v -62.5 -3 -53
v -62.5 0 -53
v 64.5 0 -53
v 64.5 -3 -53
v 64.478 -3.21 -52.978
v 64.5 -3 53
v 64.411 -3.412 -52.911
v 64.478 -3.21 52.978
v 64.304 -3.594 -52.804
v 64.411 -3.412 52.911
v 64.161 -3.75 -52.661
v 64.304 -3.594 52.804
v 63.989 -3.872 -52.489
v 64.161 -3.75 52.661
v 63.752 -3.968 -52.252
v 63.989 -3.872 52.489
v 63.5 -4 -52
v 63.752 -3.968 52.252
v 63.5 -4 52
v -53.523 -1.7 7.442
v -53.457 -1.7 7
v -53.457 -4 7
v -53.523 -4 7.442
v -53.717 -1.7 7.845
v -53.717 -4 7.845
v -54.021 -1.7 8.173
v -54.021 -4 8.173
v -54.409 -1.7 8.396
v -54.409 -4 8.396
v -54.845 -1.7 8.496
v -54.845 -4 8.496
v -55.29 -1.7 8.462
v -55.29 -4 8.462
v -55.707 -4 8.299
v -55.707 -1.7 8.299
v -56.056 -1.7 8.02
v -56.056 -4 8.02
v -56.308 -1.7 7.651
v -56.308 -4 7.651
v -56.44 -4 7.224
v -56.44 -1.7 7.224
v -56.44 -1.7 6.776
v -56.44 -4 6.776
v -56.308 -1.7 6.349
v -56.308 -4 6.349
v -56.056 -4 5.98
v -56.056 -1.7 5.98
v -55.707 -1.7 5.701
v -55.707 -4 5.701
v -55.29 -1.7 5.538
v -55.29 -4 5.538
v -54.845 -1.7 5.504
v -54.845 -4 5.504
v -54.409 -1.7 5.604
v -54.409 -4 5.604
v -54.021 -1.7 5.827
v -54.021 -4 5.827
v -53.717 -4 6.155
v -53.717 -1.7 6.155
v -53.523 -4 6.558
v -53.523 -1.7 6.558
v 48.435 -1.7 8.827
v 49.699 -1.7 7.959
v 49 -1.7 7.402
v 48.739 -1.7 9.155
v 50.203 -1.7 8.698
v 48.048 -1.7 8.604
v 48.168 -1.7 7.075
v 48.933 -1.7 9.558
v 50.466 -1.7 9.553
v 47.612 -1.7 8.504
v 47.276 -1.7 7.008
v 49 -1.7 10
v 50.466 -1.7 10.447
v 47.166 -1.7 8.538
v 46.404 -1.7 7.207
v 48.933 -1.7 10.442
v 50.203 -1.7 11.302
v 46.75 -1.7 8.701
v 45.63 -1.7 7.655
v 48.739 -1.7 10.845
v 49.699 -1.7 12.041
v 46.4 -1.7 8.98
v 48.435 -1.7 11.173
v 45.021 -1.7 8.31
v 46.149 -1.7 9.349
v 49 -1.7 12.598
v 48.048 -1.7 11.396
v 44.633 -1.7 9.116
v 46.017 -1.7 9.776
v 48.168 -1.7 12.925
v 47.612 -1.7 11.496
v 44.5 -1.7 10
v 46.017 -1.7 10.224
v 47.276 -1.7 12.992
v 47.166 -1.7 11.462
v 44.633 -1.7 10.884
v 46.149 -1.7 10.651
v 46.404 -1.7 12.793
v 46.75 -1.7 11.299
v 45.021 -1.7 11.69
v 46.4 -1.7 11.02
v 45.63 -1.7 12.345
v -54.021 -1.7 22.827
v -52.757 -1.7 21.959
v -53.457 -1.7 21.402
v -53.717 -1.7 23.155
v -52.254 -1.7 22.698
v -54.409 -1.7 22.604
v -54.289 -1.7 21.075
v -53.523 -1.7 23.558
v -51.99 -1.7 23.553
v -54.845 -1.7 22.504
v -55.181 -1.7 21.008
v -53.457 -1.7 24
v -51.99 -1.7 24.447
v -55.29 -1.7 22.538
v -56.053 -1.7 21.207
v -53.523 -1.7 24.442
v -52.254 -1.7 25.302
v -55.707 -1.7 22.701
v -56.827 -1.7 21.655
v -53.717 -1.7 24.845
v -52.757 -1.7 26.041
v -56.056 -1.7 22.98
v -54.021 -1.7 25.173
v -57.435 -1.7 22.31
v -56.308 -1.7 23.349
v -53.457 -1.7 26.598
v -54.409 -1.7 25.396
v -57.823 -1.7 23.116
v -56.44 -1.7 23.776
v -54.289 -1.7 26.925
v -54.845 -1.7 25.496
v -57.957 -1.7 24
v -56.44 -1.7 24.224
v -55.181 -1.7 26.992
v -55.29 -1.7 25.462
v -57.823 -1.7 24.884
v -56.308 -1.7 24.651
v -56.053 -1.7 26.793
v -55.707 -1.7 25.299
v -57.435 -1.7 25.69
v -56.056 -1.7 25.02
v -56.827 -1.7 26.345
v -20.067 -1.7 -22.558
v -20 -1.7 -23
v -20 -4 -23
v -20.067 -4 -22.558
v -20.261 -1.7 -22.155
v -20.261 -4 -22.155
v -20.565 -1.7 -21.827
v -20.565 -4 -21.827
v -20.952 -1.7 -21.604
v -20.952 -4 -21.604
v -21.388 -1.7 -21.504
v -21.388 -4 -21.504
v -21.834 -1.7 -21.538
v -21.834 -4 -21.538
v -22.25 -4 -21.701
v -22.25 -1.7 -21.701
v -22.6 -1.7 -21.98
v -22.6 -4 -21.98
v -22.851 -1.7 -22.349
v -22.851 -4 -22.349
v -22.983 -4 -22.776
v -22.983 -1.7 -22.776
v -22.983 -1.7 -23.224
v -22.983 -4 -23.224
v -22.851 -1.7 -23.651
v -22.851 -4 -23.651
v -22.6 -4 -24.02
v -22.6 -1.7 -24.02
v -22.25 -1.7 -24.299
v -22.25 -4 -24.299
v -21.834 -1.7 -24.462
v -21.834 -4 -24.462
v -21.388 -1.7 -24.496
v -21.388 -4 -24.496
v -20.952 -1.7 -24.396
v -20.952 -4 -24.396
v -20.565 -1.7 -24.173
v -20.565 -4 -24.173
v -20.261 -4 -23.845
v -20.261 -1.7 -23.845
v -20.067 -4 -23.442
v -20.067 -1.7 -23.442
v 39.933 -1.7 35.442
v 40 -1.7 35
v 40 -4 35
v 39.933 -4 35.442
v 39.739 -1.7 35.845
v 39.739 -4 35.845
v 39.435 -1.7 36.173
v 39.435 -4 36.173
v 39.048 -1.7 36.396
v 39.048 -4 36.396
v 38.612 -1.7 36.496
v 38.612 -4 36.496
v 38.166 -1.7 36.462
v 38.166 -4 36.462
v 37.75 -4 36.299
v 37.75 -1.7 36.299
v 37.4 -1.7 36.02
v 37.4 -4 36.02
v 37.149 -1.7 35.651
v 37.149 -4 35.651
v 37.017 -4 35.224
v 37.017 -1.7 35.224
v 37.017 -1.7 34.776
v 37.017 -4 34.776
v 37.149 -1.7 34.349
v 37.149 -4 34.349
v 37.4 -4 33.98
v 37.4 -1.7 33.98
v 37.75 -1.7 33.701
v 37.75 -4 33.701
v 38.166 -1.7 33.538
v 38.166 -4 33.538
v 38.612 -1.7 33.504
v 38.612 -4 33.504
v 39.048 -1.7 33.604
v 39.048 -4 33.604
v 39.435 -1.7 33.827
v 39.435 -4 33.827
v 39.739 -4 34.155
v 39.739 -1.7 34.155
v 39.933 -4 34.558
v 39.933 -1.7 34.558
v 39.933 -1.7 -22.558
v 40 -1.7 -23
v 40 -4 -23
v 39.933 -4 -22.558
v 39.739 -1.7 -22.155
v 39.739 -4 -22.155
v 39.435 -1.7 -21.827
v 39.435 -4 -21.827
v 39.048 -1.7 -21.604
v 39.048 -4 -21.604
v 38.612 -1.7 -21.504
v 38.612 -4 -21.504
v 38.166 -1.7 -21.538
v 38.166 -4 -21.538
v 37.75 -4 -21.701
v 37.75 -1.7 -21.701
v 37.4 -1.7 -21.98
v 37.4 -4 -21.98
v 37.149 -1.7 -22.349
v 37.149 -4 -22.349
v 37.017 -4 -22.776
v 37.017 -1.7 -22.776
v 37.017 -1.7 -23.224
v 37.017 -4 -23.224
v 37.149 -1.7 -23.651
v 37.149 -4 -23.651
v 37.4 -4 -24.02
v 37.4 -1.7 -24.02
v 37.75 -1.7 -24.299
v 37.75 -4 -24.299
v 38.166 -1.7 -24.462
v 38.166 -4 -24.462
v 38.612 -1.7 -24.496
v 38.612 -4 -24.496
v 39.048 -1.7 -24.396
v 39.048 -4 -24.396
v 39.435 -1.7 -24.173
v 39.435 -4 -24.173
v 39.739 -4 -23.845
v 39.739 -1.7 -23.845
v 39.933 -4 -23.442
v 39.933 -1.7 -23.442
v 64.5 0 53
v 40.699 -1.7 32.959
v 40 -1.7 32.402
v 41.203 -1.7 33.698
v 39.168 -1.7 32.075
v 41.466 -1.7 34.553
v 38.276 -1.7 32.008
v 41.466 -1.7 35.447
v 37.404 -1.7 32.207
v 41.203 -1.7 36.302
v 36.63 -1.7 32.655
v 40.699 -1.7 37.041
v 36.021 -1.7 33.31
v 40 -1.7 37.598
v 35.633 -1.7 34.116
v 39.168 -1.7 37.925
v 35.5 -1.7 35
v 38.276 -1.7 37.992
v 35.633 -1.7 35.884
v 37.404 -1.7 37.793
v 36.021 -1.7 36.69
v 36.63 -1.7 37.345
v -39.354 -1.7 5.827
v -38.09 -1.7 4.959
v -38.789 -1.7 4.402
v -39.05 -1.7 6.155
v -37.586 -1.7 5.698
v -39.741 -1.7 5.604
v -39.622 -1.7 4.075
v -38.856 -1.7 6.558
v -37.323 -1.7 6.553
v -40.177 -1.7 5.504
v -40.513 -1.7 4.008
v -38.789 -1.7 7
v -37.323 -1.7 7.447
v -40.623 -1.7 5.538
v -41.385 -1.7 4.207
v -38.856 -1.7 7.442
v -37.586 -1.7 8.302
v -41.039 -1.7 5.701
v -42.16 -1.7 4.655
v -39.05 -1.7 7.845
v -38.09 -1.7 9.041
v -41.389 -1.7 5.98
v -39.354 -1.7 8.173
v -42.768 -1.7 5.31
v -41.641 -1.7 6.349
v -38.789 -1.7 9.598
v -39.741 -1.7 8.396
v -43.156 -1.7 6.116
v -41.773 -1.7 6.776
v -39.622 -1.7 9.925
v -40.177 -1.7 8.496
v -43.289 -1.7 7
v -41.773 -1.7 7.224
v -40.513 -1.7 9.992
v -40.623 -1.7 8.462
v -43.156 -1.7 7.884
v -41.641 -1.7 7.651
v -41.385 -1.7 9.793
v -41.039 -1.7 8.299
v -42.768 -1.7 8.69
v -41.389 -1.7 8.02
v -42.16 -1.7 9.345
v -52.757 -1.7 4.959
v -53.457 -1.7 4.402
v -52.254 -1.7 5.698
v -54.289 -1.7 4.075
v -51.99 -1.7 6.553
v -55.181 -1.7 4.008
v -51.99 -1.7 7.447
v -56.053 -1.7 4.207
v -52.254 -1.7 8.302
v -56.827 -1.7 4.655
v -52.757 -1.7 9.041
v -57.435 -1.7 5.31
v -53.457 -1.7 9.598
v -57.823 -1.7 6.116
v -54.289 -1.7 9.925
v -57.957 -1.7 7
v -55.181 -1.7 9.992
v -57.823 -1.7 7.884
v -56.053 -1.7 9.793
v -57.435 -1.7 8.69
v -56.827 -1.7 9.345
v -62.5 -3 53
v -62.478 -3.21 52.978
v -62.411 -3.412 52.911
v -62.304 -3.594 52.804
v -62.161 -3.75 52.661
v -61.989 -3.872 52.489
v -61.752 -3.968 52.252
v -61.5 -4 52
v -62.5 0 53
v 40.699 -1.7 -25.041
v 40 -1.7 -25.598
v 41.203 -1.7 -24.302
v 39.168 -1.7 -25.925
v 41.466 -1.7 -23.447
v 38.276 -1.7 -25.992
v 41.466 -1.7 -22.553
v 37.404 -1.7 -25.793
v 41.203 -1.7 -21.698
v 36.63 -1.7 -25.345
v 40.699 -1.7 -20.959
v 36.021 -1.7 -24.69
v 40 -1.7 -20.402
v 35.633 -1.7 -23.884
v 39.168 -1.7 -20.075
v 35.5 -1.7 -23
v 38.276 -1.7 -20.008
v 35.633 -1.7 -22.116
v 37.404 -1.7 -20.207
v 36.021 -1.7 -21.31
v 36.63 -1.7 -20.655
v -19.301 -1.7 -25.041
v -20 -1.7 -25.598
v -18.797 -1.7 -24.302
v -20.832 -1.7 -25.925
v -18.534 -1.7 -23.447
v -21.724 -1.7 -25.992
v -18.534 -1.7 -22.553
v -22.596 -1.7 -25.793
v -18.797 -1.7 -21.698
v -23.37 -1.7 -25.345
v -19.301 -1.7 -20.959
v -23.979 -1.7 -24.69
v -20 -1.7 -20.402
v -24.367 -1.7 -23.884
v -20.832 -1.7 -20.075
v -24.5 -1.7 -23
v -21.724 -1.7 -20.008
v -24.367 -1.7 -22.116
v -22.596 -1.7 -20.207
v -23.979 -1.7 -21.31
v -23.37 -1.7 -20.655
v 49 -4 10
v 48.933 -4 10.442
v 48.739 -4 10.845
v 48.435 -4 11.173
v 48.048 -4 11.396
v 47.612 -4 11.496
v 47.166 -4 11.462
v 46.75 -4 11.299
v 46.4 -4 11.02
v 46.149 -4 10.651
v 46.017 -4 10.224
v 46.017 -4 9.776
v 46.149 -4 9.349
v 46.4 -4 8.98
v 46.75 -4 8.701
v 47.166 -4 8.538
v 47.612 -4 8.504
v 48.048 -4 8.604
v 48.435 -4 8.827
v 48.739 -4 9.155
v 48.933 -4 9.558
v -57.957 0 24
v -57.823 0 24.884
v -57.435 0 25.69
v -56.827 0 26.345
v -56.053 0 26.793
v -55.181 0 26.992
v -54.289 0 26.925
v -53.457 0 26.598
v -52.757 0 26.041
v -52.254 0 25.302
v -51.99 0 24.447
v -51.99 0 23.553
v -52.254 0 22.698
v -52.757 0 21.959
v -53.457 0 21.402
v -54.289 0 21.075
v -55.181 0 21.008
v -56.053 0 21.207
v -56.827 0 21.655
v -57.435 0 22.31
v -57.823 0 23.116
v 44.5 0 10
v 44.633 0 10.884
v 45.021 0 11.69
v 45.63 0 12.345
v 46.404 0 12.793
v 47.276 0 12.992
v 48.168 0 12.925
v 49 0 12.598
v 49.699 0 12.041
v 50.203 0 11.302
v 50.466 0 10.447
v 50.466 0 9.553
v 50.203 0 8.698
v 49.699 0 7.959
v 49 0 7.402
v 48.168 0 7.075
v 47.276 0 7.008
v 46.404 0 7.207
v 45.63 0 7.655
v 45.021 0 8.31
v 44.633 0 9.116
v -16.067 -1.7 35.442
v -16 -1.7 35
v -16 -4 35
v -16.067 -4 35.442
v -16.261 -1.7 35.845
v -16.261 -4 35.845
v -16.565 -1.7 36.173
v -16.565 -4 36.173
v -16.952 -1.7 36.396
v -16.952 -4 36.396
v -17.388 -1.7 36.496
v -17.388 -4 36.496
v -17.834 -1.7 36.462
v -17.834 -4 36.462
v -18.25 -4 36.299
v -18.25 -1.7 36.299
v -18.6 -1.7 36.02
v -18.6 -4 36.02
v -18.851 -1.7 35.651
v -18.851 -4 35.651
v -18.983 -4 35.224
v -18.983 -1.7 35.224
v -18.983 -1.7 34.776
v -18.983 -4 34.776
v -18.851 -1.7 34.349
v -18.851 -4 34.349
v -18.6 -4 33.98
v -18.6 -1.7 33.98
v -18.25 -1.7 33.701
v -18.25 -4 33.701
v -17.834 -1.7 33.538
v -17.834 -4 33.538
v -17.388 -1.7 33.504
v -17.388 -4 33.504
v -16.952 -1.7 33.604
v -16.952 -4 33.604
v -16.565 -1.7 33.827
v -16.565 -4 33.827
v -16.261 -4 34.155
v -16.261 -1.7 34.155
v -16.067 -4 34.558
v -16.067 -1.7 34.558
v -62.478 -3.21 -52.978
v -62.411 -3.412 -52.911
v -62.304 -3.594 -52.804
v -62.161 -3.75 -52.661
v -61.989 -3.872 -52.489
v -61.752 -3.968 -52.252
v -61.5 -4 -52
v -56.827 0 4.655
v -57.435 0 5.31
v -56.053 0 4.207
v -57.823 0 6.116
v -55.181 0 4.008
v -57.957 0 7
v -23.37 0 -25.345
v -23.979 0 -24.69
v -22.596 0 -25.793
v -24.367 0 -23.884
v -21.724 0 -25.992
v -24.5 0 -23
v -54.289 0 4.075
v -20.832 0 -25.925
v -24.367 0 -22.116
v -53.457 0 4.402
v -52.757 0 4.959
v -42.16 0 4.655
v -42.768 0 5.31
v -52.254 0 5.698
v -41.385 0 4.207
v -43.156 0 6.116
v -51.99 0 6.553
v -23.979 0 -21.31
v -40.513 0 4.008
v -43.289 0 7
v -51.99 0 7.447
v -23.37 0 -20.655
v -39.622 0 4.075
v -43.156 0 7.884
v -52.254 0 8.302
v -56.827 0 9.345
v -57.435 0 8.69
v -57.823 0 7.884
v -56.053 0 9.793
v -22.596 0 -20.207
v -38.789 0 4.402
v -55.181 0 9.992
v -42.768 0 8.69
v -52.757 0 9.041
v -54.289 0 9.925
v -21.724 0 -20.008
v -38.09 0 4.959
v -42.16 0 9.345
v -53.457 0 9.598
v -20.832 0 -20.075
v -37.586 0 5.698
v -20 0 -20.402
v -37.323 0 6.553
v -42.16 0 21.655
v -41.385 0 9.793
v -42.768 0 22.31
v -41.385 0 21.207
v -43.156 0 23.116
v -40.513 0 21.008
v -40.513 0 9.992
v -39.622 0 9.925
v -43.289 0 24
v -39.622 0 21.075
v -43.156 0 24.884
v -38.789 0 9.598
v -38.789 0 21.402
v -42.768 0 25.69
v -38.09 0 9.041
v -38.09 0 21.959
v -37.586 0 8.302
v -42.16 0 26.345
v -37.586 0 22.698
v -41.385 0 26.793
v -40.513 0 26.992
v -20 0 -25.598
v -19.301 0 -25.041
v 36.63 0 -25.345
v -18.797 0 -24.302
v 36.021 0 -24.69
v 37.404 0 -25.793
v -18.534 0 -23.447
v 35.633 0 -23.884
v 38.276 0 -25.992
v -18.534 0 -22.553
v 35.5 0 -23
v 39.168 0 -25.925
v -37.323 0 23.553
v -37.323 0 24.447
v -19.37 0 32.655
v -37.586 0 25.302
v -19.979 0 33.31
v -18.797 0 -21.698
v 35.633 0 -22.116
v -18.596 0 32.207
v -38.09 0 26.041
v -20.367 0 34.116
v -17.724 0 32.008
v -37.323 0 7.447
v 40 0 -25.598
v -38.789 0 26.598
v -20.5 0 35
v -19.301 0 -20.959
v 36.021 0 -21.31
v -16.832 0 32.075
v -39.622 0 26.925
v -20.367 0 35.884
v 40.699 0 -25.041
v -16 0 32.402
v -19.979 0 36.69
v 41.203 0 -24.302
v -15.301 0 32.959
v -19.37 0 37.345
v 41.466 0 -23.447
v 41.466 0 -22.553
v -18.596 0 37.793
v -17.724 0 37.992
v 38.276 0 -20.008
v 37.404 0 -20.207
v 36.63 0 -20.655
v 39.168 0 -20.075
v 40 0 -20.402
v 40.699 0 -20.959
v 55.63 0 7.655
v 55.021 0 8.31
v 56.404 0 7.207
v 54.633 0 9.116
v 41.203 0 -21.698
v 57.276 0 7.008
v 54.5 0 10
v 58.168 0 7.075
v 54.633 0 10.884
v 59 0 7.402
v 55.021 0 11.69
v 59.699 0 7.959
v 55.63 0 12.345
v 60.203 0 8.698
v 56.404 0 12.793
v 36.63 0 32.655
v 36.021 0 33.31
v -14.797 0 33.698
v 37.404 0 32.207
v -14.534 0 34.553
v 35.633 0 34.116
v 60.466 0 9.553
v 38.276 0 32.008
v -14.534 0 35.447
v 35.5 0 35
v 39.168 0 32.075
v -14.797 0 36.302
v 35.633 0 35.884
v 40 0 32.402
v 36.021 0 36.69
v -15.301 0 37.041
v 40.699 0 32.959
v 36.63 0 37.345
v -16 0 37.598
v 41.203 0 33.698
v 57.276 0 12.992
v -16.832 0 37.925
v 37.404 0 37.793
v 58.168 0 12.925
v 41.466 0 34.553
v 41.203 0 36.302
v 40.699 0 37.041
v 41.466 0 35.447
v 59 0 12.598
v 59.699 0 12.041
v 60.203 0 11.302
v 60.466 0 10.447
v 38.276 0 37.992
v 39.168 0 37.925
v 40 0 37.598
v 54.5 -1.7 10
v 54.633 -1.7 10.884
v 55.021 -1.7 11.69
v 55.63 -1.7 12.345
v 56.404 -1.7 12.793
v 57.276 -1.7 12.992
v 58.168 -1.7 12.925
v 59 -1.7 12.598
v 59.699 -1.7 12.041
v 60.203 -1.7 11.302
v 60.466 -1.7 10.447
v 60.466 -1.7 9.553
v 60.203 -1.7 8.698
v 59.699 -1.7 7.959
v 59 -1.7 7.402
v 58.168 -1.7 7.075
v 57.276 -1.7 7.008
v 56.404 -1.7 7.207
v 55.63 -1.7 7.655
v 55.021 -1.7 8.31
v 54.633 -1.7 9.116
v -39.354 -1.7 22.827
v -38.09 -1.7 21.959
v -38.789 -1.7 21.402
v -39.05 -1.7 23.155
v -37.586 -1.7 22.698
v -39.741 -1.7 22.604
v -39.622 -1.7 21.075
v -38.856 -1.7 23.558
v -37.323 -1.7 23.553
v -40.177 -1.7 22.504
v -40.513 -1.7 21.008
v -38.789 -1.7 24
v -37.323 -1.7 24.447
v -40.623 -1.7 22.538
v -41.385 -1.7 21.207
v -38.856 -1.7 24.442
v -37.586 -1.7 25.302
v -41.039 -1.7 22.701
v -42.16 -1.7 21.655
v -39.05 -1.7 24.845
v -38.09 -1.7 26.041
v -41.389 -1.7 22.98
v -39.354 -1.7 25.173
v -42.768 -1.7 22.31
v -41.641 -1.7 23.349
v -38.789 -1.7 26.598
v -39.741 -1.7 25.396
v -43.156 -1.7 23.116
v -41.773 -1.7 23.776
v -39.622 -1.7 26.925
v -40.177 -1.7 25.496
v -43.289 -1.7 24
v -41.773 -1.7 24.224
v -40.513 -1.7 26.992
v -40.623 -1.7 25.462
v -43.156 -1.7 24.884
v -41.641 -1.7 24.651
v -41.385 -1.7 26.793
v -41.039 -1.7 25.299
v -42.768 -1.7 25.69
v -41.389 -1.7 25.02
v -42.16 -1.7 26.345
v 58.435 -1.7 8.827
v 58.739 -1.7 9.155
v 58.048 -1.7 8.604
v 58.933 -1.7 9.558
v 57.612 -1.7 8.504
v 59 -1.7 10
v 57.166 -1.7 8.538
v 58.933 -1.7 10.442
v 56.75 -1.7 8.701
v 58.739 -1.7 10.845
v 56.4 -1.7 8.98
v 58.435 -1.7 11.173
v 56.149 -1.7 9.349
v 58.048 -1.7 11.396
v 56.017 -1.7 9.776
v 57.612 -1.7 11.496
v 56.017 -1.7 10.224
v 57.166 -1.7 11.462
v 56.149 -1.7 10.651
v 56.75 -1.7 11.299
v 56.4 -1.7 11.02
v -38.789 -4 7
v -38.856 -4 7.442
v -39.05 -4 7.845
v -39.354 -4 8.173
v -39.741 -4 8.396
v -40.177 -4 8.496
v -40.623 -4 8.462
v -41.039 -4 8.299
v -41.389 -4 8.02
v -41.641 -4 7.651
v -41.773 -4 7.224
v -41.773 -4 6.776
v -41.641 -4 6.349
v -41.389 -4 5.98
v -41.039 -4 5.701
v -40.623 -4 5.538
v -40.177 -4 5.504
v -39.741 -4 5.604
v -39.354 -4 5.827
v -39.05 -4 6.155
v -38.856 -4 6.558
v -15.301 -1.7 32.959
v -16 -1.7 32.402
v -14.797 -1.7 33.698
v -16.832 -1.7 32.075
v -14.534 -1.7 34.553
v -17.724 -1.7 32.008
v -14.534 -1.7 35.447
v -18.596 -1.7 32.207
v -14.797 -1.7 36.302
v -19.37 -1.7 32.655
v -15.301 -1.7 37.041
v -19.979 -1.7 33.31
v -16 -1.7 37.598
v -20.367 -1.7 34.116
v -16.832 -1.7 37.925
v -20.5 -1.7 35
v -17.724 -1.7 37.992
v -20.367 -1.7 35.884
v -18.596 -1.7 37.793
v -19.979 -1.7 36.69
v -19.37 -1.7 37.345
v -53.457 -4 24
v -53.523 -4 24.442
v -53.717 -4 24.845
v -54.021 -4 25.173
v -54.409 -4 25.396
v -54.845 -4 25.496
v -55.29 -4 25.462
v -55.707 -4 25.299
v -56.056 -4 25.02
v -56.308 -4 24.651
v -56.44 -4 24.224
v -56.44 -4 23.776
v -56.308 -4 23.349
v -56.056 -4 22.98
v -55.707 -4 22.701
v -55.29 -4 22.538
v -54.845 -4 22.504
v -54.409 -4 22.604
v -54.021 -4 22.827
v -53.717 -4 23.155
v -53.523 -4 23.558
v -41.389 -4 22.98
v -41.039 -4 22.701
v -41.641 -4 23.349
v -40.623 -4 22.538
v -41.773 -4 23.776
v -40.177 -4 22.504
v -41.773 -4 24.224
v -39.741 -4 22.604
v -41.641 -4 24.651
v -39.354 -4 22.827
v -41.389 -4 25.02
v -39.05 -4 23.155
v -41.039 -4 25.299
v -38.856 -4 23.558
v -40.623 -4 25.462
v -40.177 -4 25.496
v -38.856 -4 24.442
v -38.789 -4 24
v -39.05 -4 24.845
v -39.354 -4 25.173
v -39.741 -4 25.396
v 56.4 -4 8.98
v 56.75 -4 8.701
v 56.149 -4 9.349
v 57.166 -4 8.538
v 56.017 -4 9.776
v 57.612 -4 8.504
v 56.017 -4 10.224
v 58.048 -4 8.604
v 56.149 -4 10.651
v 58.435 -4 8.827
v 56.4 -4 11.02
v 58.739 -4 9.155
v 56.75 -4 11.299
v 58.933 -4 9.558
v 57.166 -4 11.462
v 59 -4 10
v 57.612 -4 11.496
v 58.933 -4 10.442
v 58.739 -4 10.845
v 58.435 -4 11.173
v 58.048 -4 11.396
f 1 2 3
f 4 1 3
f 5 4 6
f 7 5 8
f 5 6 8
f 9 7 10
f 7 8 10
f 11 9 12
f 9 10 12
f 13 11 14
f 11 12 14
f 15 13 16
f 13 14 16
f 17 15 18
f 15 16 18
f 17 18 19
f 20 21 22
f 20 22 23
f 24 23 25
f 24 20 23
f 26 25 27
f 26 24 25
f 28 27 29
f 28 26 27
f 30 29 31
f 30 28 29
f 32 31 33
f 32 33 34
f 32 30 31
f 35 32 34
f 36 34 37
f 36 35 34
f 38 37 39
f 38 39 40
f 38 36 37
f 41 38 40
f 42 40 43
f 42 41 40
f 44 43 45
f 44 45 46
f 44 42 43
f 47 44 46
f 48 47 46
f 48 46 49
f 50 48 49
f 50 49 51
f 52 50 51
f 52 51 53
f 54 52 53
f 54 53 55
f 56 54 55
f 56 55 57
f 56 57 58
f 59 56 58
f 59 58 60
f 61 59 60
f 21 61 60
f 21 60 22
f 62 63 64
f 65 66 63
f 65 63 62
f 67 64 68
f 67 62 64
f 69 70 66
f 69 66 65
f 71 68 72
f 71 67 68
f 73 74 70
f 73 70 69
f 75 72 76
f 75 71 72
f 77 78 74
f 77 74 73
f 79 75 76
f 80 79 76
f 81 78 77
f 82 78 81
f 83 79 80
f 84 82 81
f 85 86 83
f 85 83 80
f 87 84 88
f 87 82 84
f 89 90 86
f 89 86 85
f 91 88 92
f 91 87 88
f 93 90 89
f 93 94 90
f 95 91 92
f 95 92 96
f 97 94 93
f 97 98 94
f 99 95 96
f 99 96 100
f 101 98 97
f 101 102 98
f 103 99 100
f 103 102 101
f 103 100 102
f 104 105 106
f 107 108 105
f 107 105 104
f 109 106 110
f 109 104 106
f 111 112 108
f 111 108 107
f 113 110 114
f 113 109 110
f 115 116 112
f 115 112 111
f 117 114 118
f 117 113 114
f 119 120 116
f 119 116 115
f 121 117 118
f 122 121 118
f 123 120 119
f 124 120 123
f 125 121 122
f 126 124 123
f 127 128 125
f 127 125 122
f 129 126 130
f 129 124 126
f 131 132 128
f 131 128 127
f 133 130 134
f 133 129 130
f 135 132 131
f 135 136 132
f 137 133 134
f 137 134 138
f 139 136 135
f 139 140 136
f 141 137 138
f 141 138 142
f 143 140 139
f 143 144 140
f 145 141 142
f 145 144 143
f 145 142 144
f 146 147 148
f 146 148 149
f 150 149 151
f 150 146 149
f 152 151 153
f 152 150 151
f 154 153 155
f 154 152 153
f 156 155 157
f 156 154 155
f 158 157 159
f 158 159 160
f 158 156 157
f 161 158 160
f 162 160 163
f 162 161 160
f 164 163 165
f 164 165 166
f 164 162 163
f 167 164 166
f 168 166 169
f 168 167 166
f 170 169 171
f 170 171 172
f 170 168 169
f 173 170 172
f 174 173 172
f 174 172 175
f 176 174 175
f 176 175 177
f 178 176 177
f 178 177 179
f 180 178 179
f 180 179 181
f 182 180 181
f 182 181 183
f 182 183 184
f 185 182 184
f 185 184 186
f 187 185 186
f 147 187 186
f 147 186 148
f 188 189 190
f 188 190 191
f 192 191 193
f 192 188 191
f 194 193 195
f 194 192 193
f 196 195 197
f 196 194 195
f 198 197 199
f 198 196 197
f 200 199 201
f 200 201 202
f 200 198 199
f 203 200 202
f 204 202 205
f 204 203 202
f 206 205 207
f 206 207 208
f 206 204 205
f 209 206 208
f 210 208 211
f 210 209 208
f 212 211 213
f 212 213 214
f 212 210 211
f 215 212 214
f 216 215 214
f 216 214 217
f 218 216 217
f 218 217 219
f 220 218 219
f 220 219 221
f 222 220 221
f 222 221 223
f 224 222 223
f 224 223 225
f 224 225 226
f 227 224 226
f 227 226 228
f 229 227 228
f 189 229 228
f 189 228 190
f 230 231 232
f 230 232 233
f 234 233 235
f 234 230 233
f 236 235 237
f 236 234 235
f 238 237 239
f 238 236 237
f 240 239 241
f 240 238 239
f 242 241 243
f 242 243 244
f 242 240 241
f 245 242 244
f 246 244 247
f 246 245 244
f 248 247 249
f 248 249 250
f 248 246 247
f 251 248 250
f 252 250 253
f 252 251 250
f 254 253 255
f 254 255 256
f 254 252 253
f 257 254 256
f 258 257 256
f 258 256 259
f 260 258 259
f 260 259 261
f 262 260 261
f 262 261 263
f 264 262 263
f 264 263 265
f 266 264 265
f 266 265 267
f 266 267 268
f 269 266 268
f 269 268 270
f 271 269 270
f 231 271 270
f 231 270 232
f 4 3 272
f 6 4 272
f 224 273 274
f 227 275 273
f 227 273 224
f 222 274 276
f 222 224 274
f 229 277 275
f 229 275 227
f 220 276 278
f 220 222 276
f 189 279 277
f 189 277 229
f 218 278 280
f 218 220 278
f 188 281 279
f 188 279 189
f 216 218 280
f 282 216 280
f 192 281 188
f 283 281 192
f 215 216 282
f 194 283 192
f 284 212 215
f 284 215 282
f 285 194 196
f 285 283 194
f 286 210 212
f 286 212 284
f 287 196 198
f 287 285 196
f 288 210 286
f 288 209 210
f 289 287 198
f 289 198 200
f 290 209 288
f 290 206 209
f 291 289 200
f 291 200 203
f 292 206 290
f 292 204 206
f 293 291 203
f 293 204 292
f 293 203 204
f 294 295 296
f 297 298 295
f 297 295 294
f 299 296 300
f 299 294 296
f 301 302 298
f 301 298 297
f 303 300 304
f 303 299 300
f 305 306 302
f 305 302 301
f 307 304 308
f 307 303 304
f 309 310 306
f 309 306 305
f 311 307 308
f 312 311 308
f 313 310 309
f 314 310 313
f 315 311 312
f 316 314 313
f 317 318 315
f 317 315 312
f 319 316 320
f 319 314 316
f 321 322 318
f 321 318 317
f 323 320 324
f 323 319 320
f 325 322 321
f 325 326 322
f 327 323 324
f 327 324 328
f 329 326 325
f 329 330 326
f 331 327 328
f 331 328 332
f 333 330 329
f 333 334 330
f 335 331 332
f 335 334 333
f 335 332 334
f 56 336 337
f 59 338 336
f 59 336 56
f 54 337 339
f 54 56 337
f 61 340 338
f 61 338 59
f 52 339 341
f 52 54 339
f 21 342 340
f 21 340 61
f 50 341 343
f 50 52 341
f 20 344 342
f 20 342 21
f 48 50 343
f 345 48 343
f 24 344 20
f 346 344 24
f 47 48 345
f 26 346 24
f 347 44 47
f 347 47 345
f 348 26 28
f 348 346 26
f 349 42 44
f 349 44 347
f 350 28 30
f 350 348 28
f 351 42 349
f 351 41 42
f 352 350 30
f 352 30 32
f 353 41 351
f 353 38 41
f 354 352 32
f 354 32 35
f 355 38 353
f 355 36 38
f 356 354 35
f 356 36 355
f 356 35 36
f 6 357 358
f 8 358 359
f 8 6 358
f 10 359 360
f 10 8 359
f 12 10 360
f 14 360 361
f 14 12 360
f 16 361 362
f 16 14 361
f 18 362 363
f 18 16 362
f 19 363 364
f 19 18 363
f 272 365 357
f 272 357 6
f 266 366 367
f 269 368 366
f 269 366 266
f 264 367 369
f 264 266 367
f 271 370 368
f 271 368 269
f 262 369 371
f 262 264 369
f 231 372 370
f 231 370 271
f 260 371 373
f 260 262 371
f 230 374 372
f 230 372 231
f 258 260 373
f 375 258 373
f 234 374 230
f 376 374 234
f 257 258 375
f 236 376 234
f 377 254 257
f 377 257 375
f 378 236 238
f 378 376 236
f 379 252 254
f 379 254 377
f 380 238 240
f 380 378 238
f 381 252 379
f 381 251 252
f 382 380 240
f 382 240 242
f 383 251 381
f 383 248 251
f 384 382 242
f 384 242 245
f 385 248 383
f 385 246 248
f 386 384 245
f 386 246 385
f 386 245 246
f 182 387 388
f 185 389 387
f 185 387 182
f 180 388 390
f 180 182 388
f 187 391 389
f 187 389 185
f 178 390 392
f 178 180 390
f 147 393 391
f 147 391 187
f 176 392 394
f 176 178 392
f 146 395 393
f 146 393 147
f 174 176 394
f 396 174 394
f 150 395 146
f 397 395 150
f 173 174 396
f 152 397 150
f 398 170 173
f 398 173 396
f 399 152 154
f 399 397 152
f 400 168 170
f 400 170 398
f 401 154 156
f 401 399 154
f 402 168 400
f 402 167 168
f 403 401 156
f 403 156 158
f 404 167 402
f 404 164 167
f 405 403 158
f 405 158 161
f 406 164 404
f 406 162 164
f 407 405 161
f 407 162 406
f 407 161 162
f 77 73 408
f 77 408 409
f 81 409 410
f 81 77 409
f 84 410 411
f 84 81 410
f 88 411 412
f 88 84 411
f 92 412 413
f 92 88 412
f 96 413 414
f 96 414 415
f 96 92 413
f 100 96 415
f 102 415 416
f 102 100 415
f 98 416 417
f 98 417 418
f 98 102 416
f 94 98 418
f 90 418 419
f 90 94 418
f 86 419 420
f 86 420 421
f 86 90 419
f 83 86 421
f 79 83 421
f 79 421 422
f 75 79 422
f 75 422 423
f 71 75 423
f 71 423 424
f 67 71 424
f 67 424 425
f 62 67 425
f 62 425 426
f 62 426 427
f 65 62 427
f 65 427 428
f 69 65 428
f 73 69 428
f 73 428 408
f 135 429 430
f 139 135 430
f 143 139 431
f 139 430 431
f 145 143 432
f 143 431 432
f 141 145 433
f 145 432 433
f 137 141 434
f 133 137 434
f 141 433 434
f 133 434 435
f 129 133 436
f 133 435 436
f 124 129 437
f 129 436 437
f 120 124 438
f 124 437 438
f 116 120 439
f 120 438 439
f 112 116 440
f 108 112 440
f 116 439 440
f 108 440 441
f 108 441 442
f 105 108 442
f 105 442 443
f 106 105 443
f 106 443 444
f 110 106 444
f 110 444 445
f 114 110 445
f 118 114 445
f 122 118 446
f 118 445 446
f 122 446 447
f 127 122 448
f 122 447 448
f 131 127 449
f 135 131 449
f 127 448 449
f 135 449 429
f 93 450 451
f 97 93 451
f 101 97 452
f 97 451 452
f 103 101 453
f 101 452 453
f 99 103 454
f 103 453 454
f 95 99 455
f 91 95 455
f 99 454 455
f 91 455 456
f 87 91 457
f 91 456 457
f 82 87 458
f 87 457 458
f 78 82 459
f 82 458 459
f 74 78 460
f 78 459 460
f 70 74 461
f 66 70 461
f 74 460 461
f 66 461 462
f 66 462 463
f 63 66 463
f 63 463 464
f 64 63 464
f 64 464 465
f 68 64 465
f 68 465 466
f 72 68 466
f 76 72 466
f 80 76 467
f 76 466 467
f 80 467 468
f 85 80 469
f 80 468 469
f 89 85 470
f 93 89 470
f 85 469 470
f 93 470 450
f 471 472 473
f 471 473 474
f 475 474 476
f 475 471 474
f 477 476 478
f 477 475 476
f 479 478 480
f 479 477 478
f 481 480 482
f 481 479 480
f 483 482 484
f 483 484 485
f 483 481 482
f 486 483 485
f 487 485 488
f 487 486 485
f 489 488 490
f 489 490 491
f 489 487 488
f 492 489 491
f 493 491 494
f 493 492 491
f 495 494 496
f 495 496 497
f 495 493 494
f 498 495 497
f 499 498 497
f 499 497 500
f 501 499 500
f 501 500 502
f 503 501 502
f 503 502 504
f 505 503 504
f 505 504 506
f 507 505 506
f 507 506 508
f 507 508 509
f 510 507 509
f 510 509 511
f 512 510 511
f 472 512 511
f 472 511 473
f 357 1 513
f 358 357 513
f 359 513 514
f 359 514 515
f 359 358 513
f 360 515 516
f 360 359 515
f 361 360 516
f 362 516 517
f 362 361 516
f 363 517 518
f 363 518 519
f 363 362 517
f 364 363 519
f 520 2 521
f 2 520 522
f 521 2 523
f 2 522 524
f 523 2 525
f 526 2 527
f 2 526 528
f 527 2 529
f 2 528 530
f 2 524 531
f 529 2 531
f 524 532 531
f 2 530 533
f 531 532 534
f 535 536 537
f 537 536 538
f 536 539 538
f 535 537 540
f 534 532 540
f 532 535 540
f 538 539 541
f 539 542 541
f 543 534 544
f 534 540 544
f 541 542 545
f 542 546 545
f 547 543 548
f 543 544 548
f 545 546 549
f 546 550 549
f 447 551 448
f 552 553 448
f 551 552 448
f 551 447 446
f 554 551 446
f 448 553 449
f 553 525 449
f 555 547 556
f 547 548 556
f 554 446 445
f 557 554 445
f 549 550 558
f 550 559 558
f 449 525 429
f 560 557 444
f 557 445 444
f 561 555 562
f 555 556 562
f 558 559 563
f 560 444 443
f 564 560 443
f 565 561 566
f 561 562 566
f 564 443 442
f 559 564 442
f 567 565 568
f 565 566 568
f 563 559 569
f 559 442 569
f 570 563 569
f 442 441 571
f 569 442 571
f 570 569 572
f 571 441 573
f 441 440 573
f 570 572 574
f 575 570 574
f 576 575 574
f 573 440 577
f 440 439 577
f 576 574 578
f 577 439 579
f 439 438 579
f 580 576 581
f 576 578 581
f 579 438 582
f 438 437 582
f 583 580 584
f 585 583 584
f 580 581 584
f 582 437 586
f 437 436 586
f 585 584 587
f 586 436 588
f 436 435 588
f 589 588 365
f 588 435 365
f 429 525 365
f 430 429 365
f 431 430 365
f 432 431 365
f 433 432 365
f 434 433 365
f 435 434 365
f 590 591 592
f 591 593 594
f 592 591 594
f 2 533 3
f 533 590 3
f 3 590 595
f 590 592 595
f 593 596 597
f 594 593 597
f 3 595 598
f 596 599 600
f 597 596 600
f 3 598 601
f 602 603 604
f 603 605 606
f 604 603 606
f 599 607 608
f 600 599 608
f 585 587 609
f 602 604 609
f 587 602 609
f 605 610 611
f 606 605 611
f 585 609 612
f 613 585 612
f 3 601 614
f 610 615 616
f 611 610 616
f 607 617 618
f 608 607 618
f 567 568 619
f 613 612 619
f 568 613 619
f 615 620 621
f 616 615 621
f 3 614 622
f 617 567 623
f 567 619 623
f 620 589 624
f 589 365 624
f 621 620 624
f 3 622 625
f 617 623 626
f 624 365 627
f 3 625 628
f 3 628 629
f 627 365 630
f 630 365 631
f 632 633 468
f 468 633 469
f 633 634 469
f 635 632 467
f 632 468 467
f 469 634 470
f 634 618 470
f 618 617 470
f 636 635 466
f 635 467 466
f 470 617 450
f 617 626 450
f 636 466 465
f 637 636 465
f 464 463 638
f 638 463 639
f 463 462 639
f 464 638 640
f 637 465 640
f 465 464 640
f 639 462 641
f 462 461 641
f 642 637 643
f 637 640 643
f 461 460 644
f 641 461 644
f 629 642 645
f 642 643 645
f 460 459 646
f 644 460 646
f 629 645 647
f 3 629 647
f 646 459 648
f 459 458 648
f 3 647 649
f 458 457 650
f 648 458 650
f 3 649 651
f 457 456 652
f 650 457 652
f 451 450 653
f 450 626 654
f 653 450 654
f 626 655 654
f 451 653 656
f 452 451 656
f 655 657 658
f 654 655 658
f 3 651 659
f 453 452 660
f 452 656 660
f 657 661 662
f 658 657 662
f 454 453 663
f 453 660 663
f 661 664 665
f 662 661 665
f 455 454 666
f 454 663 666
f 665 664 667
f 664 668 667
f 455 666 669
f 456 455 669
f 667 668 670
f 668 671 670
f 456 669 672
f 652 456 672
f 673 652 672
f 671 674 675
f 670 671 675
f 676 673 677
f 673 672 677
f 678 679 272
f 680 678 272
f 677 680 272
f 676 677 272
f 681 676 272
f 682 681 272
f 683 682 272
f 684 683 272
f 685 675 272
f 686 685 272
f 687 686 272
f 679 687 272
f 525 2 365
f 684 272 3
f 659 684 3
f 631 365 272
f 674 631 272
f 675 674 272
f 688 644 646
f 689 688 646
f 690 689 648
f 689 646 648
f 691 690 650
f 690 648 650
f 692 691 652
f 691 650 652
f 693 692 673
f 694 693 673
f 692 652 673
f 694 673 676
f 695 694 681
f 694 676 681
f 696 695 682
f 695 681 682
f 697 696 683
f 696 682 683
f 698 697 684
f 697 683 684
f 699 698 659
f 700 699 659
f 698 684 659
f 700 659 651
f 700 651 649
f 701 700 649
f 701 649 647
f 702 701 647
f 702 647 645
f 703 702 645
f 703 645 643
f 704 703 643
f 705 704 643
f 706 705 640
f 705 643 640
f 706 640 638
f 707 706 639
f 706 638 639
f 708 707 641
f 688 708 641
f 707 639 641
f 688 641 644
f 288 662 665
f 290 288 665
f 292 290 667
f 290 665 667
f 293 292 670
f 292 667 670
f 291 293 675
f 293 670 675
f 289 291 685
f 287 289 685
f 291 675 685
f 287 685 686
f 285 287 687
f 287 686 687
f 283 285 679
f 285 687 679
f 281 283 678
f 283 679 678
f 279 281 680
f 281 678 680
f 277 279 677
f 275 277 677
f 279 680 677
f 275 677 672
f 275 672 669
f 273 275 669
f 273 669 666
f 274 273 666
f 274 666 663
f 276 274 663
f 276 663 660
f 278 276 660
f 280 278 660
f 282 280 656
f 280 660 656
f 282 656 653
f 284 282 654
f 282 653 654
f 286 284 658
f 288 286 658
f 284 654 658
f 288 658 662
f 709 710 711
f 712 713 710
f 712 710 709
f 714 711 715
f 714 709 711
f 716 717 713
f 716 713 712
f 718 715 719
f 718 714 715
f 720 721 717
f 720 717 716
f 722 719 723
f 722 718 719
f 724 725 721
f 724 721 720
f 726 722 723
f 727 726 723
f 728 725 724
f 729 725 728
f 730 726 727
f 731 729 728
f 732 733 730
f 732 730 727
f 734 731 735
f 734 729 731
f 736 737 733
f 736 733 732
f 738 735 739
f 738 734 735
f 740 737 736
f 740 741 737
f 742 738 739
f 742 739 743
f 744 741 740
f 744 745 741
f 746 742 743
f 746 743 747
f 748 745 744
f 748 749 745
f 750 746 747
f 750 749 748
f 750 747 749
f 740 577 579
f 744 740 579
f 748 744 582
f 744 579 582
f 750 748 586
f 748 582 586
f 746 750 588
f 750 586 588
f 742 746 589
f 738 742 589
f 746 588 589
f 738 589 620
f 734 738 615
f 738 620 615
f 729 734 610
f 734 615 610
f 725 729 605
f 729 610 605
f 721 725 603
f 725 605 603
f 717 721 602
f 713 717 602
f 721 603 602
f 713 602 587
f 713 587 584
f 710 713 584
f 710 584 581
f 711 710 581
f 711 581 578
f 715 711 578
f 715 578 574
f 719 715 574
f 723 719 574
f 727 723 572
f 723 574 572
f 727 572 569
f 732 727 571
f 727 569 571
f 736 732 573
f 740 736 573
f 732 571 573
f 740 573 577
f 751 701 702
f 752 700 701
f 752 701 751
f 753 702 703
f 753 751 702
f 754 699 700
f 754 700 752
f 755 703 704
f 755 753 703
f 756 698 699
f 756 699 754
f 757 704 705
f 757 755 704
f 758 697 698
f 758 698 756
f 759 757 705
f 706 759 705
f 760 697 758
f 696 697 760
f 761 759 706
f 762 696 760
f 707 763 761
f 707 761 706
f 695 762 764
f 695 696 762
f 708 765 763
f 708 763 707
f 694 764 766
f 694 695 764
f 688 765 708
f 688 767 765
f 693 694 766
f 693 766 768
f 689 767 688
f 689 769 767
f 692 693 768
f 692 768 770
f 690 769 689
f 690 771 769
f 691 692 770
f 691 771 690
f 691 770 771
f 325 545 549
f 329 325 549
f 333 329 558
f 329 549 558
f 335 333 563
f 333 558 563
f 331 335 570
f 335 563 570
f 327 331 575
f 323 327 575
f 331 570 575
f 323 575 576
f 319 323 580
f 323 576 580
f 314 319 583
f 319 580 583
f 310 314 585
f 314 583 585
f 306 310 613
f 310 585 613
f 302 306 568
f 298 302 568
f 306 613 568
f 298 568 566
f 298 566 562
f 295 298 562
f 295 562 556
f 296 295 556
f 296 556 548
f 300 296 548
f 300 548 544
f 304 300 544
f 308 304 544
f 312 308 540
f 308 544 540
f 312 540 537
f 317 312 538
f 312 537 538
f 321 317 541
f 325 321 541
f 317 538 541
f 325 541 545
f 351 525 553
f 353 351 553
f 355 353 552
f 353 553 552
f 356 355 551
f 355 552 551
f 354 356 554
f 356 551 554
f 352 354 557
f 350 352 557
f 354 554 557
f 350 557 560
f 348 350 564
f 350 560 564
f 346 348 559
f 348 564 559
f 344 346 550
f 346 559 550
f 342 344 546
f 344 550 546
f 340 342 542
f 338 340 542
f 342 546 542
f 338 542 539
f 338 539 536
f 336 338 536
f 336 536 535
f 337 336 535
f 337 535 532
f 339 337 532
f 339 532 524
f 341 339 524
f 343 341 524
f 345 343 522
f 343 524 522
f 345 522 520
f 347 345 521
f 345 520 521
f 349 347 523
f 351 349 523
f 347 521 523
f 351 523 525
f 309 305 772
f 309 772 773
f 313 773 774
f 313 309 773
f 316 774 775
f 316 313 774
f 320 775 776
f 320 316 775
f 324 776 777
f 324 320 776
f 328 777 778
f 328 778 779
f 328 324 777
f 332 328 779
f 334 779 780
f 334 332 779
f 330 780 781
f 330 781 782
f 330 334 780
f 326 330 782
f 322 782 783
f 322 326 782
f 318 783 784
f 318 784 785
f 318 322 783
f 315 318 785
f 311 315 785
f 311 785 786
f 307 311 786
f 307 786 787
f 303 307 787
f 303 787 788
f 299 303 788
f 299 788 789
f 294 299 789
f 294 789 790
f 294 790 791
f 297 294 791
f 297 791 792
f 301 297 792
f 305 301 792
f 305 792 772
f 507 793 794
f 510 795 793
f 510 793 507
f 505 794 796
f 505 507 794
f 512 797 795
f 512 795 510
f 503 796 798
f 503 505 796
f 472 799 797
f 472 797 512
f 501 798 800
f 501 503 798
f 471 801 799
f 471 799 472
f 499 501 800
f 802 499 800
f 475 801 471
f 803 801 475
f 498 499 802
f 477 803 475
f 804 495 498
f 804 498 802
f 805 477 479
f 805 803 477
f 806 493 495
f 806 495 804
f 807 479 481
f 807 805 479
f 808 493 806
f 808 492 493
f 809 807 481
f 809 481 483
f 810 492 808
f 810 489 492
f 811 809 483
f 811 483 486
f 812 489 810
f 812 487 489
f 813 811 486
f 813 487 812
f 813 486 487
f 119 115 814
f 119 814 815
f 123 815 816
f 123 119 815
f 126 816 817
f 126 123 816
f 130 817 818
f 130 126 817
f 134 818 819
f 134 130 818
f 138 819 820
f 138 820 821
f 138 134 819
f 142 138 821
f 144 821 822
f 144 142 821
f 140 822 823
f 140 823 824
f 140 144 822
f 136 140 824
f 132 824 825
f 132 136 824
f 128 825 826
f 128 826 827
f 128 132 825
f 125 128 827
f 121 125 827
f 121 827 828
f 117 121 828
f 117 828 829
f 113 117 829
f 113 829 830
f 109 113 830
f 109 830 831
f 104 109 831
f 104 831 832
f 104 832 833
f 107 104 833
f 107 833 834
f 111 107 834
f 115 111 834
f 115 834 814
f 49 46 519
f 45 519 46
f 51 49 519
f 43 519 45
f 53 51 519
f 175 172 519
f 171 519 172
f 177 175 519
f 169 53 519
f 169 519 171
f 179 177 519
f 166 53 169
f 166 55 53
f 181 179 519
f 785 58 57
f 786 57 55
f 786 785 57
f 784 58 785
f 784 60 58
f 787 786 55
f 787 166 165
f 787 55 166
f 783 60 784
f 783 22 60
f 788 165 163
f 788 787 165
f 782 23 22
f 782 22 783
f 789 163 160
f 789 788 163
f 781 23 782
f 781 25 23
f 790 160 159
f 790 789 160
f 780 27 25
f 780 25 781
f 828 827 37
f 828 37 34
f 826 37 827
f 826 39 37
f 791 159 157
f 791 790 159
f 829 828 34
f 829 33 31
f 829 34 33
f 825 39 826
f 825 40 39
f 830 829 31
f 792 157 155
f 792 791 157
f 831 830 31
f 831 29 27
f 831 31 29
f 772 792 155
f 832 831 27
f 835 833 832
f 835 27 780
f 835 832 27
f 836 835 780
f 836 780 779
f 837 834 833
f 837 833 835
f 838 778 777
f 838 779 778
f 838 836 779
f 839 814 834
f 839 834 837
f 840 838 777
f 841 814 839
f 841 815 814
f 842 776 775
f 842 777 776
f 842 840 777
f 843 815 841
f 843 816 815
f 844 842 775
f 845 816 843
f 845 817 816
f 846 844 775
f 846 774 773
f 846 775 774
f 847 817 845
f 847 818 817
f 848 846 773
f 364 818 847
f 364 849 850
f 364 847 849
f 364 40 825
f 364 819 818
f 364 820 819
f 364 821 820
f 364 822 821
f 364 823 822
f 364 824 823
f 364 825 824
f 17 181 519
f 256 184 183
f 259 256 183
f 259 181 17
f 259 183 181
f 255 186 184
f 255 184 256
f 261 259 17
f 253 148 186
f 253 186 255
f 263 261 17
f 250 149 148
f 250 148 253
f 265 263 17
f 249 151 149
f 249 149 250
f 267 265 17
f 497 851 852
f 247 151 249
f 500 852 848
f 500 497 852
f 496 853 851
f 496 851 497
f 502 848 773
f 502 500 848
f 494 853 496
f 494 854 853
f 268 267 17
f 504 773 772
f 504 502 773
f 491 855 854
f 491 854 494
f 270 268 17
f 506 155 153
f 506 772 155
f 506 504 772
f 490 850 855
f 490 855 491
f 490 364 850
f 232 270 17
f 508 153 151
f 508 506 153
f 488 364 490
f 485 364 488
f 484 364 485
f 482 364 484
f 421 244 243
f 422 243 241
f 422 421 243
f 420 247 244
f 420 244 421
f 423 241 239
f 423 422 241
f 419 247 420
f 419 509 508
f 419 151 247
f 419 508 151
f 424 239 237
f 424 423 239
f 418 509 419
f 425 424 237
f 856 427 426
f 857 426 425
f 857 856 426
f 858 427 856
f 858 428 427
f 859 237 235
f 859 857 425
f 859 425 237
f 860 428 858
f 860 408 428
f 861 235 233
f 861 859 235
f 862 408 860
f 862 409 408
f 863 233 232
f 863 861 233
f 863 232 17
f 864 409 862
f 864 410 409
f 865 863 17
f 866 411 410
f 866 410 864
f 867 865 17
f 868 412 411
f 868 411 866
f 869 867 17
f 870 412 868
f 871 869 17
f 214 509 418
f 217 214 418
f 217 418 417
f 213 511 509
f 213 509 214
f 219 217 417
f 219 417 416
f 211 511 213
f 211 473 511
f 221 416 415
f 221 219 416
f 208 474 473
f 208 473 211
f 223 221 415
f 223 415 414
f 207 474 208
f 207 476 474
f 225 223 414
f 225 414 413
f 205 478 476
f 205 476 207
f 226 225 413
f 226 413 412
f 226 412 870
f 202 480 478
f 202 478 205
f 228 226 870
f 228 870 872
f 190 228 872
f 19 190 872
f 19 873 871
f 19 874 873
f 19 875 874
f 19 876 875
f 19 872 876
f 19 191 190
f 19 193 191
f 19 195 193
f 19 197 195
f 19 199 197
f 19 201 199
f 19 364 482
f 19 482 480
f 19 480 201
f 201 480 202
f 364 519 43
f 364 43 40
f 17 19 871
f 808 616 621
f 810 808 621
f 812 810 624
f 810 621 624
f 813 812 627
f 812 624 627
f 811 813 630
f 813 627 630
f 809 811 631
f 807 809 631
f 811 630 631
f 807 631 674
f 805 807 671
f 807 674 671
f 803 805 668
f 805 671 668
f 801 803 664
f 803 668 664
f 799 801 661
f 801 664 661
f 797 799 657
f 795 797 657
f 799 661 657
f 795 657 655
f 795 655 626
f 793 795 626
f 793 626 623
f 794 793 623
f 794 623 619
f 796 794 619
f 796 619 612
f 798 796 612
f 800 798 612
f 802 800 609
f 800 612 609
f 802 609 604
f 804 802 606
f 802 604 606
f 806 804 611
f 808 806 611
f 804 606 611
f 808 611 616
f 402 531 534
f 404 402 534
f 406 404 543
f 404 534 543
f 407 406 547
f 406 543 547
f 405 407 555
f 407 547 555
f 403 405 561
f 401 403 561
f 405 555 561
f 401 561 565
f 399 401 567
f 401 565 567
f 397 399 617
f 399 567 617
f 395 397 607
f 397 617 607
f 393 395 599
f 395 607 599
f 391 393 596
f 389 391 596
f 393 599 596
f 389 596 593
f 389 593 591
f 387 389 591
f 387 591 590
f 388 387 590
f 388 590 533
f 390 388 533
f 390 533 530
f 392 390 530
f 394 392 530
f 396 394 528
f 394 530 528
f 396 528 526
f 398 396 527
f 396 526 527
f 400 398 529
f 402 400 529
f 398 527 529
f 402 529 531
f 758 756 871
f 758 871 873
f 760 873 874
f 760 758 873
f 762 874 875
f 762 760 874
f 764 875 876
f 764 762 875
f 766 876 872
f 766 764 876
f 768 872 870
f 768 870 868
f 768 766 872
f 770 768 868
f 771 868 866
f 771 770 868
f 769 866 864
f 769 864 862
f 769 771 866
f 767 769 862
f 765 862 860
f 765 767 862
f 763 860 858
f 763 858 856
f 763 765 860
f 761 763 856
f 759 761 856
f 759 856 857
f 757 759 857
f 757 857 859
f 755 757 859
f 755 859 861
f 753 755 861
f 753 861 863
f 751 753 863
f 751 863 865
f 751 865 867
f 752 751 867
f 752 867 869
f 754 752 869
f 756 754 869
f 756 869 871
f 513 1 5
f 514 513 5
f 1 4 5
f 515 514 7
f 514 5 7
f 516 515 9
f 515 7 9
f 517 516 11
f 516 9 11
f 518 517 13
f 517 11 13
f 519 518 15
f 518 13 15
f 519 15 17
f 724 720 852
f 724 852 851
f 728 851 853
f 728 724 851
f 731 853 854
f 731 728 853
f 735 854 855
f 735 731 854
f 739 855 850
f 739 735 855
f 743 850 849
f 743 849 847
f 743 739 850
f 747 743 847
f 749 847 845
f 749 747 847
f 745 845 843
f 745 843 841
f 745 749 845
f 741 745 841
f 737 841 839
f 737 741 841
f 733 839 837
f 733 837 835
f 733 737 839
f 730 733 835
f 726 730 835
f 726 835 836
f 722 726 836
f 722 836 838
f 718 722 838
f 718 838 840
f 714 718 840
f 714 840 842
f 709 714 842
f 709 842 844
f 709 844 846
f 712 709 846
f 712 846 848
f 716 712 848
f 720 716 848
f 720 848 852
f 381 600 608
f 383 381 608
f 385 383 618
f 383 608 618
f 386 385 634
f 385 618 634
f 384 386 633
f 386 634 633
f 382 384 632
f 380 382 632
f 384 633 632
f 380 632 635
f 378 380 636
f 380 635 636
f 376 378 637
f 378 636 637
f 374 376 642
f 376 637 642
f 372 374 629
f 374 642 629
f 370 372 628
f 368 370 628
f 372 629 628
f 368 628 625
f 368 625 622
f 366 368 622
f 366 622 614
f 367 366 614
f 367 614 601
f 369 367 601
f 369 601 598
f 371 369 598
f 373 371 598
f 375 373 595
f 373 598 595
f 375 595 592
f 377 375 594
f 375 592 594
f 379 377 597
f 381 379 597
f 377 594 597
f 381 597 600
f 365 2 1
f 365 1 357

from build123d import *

# Parameters (mm, degrees)
F0_W     = 127
F0_H     = 106
F0_R     = 1.5
F1_DEPTH = 4
F2_R     = 1
F3_R     = 3
F3_R_2   = 1.5
F4_DEPTH = 1.7


with BuildPart() as f1:
    # F0 (on Front) → F1 (new body)
    with BuildSketch(Plane.XZ):
        with Locations((1, 0)):
            Rectangle(F0_W, F0_H)
        with Locations((-21.5, -23)):
            Circle(F0_R, mode=Mode.SUBTRACT)
        with Locations((38.5, -23)):
            Circle(F0_R, mode=Mode.SUBTRACT)
        with Locations((-54.956626, 7)):
            Circle(F0_R, mode=Mode.SUBTRACT)
        with Locations((-40.28926, 7)):
            Circle(F0_R, mode=Mode.SUBTRACT)
        with Locations((-54.956626, 24)):
            Circle(F0_R, mode=Mode.SUBTRACT)
        with Locations((-40.28926, 24)):
            Circle(F0_R, mode=Mode.SUBTRACT)
        with Locations((-17.5, 35)):
            Circle(F0_R, mode=Mode.SUBTRACT)
        with Locations((47.5, 10)):
            Circle(F0_R, mode=Mode.SUBTRACT)
        with Locations((57.5, 10)):
            Circle(F0_R, mode=Mode.SUBTRACT)
        with Locations((38.5, 35)):
            Circle(F0_R, mode=Mode.SUBTRACT)
    extrude(amount=F1_DEPTH)

    # F2
    f2_edges = [f1.edges().sort_by_distance(p)[0] for p in [
        (1, -4, 53),
        (-62.5, -4, 0),
        (64.5, -4, 0),
        (1, -4, -53),
    ]]
    fillet(f2_edges, radius=F2_R)

    # F3 (on face) → F4 (cut)
    with BuildSketch(Plane(origin=(0, 0, 0), x_dir=(-1, 0, 0), z_dir=(0, 1, 0))):
        with Locations((-38.5, -23)):
            Circle(F3_R)
        with Locations((-38.5, -23)):
            Circle(F3_R_2, mode=Mode.SUBTRACT)
        with Locations((-57.5, 10)):
            Circle(F3_R)
        with Locations((-57.5, 10)):
            Circle(F3_R_2, mode=Mode.SUBTRACT)
        with Locations((-47.5, 10)):
            Circle(F3_R)
        with Locations((-47.5, 10)):
            Circle(F3_R_2, mode=Mode.SUBTRACT)
        with Locations((-38.5, 35)):
            Circle(F3_R)
        with Locations((-38.5, 35)):
            Circle(F3_R_2, mode=Mode.SUBTRACT)
        with Locations((17.5, 35)):
            Circle(F3_R)
        with Locations((17.5, 35)):
            Circle(F3_R_2, mode=Mode.SUBTRACT)
        with Locations((40.28926, 24)):
            Circle(F3_R)
        with Locations((40.28926, 24)):
            Circle(F3_R_2, mode=Mode.SUBTRACT)
        with Locations((54.956626, 24)):
            Circle(F3_R)
        with Locations((54.956626, 24)):
            Circle(F3_R_2, mode=Mode.SUBTRACT)
        with Locations((54.956626, 7)):
            Circle(F3_R)
        with Locations((54.956626, 7)):
            Circle(F3_R_2, mode=Mode.SUBTRACT)
        with Locations((40.28926, 7)):
            Circle(F3_R)
        with Locations((40.28926, 7)):
            Circle(F3_R_2, mode=Mode.SUBTRACT)
        with Locations((21.5, -23)):
            Circle(F3_R)
        with Locations((21.5, -23)):
            Circle(F3_R_2, mode=Mode.SUBTRACT)
    extrude(amount=-F4_DEPTH, mode=Mode.SUBTRACT)


solid = f1.part
